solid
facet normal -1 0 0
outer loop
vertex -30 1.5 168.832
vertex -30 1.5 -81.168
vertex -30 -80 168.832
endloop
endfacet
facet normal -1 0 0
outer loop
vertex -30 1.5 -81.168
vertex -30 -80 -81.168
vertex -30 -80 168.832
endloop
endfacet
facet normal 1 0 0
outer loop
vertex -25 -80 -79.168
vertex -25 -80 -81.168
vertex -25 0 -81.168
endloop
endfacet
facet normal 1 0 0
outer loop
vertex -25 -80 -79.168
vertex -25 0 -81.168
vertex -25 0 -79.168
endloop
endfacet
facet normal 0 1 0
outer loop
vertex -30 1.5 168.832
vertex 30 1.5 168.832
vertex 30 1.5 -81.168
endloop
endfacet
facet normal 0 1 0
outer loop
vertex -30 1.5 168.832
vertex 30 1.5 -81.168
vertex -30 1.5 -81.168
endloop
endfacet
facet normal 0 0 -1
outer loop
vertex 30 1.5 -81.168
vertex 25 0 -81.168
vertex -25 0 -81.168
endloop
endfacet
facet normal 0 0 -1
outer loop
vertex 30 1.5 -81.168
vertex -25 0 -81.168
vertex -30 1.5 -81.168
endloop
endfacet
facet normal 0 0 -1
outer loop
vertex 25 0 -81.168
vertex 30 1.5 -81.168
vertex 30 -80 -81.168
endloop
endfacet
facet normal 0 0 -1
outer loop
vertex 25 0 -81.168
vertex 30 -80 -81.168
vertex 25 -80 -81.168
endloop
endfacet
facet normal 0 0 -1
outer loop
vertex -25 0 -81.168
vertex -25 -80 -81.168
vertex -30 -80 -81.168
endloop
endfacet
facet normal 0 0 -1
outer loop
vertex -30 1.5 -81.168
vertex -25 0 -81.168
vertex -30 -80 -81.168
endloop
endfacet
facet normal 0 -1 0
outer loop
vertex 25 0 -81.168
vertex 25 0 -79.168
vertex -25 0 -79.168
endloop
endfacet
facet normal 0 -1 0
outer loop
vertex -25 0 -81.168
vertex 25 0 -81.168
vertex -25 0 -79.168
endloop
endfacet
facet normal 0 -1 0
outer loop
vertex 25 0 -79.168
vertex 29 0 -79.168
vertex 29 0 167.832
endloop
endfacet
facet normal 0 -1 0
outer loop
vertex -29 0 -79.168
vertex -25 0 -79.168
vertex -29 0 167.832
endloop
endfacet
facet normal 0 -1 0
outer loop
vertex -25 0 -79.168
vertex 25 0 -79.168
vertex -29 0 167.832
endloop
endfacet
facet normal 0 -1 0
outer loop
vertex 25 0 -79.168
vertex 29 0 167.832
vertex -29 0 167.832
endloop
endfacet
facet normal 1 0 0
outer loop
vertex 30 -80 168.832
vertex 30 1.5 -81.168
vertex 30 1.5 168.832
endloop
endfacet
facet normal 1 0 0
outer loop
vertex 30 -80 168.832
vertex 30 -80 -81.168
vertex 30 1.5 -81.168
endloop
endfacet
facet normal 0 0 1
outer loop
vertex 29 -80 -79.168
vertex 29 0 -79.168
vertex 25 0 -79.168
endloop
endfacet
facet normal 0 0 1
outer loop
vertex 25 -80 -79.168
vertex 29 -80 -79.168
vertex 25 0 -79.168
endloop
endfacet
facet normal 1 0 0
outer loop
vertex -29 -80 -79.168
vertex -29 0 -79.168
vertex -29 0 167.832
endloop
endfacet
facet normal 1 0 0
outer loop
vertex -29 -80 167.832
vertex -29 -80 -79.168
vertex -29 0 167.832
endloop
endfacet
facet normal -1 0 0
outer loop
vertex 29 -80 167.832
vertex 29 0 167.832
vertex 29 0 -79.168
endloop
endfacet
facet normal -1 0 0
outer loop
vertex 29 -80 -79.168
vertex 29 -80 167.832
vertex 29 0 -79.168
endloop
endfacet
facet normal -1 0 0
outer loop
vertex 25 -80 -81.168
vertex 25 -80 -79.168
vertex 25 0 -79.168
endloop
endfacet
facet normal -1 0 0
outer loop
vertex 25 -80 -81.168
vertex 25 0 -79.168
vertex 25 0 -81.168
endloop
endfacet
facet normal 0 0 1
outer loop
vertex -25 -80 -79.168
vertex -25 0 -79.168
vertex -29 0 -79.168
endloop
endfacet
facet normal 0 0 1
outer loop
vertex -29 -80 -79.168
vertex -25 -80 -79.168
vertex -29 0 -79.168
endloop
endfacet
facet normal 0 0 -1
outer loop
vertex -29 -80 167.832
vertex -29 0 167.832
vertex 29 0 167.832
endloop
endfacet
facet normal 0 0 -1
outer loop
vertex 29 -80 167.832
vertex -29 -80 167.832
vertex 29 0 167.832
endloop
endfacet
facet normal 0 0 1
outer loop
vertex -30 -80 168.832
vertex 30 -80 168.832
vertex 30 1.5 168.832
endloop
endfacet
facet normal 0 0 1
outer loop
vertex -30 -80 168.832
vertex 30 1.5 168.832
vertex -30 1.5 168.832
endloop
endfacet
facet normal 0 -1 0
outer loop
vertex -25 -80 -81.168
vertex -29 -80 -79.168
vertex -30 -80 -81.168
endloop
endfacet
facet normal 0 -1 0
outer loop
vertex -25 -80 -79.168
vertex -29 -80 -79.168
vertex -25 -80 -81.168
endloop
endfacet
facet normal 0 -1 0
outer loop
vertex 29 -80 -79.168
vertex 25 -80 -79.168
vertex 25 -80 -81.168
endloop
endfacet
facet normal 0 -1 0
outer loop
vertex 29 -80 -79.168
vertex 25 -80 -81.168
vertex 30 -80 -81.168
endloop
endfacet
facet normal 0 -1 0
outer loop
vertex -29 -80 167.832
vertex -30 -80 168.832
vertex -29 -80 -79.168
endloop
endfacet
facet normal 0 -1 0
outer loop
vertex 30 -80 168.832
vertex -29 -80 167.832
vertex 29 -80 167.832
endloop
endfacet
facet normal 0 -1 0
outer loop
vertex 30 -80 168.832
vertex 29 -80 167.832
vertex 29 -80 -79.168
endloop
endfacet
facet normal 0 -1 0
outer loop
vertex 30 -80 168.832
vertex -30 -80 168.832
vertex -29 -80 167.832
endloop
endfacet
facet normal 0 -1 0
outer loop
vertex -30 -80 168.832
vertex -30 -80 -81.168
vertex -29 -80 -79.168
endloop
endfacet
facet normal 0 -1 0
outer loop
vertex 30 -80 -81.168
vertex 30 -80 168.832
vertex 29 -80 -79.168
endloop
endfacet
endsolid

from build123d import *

# Parameters (mm, degrees)
F1_DEPTH = 80
F2_W     = 60
F2_H     = 250
F3_DEPTH = 1.5


# Not quite as in the source:
# - a feature of the source that left no trace in its solid (it failed there, or was rolled back) is left out


with BuildPart() as f1:
    # F0 (on Front) → F1 (new body)
    with BuildSketch(Plane.XZ):
        Polygon((30, 168.8320699929), (-30, 168.8320699929), (-30, -81.1679300071), (-25, -81.1679300071), (-25, -79.1679300071), (-29, -79.1679300071), (-29, 167.8320699929), (29, 167.8320699929), (29, -79.1679300071), (25, -79.1679300071), (25, -81.1679300071), (30, -81.1679300071), align=None)
    extrude(amount=F1_DEPTH)

    # F2 (on face) → F3 (join)
    with BuildSketch(Plane(origin=(0, 0, 0), x_dir=(-1, 0, 0), z_dir=(0, 1, 0))):
        with Locations((0, 43.8320699929)):
            Rectangle(F2_W, F2_H)
    extrude(amount=F3_DEPTH)


solid = f1.part
